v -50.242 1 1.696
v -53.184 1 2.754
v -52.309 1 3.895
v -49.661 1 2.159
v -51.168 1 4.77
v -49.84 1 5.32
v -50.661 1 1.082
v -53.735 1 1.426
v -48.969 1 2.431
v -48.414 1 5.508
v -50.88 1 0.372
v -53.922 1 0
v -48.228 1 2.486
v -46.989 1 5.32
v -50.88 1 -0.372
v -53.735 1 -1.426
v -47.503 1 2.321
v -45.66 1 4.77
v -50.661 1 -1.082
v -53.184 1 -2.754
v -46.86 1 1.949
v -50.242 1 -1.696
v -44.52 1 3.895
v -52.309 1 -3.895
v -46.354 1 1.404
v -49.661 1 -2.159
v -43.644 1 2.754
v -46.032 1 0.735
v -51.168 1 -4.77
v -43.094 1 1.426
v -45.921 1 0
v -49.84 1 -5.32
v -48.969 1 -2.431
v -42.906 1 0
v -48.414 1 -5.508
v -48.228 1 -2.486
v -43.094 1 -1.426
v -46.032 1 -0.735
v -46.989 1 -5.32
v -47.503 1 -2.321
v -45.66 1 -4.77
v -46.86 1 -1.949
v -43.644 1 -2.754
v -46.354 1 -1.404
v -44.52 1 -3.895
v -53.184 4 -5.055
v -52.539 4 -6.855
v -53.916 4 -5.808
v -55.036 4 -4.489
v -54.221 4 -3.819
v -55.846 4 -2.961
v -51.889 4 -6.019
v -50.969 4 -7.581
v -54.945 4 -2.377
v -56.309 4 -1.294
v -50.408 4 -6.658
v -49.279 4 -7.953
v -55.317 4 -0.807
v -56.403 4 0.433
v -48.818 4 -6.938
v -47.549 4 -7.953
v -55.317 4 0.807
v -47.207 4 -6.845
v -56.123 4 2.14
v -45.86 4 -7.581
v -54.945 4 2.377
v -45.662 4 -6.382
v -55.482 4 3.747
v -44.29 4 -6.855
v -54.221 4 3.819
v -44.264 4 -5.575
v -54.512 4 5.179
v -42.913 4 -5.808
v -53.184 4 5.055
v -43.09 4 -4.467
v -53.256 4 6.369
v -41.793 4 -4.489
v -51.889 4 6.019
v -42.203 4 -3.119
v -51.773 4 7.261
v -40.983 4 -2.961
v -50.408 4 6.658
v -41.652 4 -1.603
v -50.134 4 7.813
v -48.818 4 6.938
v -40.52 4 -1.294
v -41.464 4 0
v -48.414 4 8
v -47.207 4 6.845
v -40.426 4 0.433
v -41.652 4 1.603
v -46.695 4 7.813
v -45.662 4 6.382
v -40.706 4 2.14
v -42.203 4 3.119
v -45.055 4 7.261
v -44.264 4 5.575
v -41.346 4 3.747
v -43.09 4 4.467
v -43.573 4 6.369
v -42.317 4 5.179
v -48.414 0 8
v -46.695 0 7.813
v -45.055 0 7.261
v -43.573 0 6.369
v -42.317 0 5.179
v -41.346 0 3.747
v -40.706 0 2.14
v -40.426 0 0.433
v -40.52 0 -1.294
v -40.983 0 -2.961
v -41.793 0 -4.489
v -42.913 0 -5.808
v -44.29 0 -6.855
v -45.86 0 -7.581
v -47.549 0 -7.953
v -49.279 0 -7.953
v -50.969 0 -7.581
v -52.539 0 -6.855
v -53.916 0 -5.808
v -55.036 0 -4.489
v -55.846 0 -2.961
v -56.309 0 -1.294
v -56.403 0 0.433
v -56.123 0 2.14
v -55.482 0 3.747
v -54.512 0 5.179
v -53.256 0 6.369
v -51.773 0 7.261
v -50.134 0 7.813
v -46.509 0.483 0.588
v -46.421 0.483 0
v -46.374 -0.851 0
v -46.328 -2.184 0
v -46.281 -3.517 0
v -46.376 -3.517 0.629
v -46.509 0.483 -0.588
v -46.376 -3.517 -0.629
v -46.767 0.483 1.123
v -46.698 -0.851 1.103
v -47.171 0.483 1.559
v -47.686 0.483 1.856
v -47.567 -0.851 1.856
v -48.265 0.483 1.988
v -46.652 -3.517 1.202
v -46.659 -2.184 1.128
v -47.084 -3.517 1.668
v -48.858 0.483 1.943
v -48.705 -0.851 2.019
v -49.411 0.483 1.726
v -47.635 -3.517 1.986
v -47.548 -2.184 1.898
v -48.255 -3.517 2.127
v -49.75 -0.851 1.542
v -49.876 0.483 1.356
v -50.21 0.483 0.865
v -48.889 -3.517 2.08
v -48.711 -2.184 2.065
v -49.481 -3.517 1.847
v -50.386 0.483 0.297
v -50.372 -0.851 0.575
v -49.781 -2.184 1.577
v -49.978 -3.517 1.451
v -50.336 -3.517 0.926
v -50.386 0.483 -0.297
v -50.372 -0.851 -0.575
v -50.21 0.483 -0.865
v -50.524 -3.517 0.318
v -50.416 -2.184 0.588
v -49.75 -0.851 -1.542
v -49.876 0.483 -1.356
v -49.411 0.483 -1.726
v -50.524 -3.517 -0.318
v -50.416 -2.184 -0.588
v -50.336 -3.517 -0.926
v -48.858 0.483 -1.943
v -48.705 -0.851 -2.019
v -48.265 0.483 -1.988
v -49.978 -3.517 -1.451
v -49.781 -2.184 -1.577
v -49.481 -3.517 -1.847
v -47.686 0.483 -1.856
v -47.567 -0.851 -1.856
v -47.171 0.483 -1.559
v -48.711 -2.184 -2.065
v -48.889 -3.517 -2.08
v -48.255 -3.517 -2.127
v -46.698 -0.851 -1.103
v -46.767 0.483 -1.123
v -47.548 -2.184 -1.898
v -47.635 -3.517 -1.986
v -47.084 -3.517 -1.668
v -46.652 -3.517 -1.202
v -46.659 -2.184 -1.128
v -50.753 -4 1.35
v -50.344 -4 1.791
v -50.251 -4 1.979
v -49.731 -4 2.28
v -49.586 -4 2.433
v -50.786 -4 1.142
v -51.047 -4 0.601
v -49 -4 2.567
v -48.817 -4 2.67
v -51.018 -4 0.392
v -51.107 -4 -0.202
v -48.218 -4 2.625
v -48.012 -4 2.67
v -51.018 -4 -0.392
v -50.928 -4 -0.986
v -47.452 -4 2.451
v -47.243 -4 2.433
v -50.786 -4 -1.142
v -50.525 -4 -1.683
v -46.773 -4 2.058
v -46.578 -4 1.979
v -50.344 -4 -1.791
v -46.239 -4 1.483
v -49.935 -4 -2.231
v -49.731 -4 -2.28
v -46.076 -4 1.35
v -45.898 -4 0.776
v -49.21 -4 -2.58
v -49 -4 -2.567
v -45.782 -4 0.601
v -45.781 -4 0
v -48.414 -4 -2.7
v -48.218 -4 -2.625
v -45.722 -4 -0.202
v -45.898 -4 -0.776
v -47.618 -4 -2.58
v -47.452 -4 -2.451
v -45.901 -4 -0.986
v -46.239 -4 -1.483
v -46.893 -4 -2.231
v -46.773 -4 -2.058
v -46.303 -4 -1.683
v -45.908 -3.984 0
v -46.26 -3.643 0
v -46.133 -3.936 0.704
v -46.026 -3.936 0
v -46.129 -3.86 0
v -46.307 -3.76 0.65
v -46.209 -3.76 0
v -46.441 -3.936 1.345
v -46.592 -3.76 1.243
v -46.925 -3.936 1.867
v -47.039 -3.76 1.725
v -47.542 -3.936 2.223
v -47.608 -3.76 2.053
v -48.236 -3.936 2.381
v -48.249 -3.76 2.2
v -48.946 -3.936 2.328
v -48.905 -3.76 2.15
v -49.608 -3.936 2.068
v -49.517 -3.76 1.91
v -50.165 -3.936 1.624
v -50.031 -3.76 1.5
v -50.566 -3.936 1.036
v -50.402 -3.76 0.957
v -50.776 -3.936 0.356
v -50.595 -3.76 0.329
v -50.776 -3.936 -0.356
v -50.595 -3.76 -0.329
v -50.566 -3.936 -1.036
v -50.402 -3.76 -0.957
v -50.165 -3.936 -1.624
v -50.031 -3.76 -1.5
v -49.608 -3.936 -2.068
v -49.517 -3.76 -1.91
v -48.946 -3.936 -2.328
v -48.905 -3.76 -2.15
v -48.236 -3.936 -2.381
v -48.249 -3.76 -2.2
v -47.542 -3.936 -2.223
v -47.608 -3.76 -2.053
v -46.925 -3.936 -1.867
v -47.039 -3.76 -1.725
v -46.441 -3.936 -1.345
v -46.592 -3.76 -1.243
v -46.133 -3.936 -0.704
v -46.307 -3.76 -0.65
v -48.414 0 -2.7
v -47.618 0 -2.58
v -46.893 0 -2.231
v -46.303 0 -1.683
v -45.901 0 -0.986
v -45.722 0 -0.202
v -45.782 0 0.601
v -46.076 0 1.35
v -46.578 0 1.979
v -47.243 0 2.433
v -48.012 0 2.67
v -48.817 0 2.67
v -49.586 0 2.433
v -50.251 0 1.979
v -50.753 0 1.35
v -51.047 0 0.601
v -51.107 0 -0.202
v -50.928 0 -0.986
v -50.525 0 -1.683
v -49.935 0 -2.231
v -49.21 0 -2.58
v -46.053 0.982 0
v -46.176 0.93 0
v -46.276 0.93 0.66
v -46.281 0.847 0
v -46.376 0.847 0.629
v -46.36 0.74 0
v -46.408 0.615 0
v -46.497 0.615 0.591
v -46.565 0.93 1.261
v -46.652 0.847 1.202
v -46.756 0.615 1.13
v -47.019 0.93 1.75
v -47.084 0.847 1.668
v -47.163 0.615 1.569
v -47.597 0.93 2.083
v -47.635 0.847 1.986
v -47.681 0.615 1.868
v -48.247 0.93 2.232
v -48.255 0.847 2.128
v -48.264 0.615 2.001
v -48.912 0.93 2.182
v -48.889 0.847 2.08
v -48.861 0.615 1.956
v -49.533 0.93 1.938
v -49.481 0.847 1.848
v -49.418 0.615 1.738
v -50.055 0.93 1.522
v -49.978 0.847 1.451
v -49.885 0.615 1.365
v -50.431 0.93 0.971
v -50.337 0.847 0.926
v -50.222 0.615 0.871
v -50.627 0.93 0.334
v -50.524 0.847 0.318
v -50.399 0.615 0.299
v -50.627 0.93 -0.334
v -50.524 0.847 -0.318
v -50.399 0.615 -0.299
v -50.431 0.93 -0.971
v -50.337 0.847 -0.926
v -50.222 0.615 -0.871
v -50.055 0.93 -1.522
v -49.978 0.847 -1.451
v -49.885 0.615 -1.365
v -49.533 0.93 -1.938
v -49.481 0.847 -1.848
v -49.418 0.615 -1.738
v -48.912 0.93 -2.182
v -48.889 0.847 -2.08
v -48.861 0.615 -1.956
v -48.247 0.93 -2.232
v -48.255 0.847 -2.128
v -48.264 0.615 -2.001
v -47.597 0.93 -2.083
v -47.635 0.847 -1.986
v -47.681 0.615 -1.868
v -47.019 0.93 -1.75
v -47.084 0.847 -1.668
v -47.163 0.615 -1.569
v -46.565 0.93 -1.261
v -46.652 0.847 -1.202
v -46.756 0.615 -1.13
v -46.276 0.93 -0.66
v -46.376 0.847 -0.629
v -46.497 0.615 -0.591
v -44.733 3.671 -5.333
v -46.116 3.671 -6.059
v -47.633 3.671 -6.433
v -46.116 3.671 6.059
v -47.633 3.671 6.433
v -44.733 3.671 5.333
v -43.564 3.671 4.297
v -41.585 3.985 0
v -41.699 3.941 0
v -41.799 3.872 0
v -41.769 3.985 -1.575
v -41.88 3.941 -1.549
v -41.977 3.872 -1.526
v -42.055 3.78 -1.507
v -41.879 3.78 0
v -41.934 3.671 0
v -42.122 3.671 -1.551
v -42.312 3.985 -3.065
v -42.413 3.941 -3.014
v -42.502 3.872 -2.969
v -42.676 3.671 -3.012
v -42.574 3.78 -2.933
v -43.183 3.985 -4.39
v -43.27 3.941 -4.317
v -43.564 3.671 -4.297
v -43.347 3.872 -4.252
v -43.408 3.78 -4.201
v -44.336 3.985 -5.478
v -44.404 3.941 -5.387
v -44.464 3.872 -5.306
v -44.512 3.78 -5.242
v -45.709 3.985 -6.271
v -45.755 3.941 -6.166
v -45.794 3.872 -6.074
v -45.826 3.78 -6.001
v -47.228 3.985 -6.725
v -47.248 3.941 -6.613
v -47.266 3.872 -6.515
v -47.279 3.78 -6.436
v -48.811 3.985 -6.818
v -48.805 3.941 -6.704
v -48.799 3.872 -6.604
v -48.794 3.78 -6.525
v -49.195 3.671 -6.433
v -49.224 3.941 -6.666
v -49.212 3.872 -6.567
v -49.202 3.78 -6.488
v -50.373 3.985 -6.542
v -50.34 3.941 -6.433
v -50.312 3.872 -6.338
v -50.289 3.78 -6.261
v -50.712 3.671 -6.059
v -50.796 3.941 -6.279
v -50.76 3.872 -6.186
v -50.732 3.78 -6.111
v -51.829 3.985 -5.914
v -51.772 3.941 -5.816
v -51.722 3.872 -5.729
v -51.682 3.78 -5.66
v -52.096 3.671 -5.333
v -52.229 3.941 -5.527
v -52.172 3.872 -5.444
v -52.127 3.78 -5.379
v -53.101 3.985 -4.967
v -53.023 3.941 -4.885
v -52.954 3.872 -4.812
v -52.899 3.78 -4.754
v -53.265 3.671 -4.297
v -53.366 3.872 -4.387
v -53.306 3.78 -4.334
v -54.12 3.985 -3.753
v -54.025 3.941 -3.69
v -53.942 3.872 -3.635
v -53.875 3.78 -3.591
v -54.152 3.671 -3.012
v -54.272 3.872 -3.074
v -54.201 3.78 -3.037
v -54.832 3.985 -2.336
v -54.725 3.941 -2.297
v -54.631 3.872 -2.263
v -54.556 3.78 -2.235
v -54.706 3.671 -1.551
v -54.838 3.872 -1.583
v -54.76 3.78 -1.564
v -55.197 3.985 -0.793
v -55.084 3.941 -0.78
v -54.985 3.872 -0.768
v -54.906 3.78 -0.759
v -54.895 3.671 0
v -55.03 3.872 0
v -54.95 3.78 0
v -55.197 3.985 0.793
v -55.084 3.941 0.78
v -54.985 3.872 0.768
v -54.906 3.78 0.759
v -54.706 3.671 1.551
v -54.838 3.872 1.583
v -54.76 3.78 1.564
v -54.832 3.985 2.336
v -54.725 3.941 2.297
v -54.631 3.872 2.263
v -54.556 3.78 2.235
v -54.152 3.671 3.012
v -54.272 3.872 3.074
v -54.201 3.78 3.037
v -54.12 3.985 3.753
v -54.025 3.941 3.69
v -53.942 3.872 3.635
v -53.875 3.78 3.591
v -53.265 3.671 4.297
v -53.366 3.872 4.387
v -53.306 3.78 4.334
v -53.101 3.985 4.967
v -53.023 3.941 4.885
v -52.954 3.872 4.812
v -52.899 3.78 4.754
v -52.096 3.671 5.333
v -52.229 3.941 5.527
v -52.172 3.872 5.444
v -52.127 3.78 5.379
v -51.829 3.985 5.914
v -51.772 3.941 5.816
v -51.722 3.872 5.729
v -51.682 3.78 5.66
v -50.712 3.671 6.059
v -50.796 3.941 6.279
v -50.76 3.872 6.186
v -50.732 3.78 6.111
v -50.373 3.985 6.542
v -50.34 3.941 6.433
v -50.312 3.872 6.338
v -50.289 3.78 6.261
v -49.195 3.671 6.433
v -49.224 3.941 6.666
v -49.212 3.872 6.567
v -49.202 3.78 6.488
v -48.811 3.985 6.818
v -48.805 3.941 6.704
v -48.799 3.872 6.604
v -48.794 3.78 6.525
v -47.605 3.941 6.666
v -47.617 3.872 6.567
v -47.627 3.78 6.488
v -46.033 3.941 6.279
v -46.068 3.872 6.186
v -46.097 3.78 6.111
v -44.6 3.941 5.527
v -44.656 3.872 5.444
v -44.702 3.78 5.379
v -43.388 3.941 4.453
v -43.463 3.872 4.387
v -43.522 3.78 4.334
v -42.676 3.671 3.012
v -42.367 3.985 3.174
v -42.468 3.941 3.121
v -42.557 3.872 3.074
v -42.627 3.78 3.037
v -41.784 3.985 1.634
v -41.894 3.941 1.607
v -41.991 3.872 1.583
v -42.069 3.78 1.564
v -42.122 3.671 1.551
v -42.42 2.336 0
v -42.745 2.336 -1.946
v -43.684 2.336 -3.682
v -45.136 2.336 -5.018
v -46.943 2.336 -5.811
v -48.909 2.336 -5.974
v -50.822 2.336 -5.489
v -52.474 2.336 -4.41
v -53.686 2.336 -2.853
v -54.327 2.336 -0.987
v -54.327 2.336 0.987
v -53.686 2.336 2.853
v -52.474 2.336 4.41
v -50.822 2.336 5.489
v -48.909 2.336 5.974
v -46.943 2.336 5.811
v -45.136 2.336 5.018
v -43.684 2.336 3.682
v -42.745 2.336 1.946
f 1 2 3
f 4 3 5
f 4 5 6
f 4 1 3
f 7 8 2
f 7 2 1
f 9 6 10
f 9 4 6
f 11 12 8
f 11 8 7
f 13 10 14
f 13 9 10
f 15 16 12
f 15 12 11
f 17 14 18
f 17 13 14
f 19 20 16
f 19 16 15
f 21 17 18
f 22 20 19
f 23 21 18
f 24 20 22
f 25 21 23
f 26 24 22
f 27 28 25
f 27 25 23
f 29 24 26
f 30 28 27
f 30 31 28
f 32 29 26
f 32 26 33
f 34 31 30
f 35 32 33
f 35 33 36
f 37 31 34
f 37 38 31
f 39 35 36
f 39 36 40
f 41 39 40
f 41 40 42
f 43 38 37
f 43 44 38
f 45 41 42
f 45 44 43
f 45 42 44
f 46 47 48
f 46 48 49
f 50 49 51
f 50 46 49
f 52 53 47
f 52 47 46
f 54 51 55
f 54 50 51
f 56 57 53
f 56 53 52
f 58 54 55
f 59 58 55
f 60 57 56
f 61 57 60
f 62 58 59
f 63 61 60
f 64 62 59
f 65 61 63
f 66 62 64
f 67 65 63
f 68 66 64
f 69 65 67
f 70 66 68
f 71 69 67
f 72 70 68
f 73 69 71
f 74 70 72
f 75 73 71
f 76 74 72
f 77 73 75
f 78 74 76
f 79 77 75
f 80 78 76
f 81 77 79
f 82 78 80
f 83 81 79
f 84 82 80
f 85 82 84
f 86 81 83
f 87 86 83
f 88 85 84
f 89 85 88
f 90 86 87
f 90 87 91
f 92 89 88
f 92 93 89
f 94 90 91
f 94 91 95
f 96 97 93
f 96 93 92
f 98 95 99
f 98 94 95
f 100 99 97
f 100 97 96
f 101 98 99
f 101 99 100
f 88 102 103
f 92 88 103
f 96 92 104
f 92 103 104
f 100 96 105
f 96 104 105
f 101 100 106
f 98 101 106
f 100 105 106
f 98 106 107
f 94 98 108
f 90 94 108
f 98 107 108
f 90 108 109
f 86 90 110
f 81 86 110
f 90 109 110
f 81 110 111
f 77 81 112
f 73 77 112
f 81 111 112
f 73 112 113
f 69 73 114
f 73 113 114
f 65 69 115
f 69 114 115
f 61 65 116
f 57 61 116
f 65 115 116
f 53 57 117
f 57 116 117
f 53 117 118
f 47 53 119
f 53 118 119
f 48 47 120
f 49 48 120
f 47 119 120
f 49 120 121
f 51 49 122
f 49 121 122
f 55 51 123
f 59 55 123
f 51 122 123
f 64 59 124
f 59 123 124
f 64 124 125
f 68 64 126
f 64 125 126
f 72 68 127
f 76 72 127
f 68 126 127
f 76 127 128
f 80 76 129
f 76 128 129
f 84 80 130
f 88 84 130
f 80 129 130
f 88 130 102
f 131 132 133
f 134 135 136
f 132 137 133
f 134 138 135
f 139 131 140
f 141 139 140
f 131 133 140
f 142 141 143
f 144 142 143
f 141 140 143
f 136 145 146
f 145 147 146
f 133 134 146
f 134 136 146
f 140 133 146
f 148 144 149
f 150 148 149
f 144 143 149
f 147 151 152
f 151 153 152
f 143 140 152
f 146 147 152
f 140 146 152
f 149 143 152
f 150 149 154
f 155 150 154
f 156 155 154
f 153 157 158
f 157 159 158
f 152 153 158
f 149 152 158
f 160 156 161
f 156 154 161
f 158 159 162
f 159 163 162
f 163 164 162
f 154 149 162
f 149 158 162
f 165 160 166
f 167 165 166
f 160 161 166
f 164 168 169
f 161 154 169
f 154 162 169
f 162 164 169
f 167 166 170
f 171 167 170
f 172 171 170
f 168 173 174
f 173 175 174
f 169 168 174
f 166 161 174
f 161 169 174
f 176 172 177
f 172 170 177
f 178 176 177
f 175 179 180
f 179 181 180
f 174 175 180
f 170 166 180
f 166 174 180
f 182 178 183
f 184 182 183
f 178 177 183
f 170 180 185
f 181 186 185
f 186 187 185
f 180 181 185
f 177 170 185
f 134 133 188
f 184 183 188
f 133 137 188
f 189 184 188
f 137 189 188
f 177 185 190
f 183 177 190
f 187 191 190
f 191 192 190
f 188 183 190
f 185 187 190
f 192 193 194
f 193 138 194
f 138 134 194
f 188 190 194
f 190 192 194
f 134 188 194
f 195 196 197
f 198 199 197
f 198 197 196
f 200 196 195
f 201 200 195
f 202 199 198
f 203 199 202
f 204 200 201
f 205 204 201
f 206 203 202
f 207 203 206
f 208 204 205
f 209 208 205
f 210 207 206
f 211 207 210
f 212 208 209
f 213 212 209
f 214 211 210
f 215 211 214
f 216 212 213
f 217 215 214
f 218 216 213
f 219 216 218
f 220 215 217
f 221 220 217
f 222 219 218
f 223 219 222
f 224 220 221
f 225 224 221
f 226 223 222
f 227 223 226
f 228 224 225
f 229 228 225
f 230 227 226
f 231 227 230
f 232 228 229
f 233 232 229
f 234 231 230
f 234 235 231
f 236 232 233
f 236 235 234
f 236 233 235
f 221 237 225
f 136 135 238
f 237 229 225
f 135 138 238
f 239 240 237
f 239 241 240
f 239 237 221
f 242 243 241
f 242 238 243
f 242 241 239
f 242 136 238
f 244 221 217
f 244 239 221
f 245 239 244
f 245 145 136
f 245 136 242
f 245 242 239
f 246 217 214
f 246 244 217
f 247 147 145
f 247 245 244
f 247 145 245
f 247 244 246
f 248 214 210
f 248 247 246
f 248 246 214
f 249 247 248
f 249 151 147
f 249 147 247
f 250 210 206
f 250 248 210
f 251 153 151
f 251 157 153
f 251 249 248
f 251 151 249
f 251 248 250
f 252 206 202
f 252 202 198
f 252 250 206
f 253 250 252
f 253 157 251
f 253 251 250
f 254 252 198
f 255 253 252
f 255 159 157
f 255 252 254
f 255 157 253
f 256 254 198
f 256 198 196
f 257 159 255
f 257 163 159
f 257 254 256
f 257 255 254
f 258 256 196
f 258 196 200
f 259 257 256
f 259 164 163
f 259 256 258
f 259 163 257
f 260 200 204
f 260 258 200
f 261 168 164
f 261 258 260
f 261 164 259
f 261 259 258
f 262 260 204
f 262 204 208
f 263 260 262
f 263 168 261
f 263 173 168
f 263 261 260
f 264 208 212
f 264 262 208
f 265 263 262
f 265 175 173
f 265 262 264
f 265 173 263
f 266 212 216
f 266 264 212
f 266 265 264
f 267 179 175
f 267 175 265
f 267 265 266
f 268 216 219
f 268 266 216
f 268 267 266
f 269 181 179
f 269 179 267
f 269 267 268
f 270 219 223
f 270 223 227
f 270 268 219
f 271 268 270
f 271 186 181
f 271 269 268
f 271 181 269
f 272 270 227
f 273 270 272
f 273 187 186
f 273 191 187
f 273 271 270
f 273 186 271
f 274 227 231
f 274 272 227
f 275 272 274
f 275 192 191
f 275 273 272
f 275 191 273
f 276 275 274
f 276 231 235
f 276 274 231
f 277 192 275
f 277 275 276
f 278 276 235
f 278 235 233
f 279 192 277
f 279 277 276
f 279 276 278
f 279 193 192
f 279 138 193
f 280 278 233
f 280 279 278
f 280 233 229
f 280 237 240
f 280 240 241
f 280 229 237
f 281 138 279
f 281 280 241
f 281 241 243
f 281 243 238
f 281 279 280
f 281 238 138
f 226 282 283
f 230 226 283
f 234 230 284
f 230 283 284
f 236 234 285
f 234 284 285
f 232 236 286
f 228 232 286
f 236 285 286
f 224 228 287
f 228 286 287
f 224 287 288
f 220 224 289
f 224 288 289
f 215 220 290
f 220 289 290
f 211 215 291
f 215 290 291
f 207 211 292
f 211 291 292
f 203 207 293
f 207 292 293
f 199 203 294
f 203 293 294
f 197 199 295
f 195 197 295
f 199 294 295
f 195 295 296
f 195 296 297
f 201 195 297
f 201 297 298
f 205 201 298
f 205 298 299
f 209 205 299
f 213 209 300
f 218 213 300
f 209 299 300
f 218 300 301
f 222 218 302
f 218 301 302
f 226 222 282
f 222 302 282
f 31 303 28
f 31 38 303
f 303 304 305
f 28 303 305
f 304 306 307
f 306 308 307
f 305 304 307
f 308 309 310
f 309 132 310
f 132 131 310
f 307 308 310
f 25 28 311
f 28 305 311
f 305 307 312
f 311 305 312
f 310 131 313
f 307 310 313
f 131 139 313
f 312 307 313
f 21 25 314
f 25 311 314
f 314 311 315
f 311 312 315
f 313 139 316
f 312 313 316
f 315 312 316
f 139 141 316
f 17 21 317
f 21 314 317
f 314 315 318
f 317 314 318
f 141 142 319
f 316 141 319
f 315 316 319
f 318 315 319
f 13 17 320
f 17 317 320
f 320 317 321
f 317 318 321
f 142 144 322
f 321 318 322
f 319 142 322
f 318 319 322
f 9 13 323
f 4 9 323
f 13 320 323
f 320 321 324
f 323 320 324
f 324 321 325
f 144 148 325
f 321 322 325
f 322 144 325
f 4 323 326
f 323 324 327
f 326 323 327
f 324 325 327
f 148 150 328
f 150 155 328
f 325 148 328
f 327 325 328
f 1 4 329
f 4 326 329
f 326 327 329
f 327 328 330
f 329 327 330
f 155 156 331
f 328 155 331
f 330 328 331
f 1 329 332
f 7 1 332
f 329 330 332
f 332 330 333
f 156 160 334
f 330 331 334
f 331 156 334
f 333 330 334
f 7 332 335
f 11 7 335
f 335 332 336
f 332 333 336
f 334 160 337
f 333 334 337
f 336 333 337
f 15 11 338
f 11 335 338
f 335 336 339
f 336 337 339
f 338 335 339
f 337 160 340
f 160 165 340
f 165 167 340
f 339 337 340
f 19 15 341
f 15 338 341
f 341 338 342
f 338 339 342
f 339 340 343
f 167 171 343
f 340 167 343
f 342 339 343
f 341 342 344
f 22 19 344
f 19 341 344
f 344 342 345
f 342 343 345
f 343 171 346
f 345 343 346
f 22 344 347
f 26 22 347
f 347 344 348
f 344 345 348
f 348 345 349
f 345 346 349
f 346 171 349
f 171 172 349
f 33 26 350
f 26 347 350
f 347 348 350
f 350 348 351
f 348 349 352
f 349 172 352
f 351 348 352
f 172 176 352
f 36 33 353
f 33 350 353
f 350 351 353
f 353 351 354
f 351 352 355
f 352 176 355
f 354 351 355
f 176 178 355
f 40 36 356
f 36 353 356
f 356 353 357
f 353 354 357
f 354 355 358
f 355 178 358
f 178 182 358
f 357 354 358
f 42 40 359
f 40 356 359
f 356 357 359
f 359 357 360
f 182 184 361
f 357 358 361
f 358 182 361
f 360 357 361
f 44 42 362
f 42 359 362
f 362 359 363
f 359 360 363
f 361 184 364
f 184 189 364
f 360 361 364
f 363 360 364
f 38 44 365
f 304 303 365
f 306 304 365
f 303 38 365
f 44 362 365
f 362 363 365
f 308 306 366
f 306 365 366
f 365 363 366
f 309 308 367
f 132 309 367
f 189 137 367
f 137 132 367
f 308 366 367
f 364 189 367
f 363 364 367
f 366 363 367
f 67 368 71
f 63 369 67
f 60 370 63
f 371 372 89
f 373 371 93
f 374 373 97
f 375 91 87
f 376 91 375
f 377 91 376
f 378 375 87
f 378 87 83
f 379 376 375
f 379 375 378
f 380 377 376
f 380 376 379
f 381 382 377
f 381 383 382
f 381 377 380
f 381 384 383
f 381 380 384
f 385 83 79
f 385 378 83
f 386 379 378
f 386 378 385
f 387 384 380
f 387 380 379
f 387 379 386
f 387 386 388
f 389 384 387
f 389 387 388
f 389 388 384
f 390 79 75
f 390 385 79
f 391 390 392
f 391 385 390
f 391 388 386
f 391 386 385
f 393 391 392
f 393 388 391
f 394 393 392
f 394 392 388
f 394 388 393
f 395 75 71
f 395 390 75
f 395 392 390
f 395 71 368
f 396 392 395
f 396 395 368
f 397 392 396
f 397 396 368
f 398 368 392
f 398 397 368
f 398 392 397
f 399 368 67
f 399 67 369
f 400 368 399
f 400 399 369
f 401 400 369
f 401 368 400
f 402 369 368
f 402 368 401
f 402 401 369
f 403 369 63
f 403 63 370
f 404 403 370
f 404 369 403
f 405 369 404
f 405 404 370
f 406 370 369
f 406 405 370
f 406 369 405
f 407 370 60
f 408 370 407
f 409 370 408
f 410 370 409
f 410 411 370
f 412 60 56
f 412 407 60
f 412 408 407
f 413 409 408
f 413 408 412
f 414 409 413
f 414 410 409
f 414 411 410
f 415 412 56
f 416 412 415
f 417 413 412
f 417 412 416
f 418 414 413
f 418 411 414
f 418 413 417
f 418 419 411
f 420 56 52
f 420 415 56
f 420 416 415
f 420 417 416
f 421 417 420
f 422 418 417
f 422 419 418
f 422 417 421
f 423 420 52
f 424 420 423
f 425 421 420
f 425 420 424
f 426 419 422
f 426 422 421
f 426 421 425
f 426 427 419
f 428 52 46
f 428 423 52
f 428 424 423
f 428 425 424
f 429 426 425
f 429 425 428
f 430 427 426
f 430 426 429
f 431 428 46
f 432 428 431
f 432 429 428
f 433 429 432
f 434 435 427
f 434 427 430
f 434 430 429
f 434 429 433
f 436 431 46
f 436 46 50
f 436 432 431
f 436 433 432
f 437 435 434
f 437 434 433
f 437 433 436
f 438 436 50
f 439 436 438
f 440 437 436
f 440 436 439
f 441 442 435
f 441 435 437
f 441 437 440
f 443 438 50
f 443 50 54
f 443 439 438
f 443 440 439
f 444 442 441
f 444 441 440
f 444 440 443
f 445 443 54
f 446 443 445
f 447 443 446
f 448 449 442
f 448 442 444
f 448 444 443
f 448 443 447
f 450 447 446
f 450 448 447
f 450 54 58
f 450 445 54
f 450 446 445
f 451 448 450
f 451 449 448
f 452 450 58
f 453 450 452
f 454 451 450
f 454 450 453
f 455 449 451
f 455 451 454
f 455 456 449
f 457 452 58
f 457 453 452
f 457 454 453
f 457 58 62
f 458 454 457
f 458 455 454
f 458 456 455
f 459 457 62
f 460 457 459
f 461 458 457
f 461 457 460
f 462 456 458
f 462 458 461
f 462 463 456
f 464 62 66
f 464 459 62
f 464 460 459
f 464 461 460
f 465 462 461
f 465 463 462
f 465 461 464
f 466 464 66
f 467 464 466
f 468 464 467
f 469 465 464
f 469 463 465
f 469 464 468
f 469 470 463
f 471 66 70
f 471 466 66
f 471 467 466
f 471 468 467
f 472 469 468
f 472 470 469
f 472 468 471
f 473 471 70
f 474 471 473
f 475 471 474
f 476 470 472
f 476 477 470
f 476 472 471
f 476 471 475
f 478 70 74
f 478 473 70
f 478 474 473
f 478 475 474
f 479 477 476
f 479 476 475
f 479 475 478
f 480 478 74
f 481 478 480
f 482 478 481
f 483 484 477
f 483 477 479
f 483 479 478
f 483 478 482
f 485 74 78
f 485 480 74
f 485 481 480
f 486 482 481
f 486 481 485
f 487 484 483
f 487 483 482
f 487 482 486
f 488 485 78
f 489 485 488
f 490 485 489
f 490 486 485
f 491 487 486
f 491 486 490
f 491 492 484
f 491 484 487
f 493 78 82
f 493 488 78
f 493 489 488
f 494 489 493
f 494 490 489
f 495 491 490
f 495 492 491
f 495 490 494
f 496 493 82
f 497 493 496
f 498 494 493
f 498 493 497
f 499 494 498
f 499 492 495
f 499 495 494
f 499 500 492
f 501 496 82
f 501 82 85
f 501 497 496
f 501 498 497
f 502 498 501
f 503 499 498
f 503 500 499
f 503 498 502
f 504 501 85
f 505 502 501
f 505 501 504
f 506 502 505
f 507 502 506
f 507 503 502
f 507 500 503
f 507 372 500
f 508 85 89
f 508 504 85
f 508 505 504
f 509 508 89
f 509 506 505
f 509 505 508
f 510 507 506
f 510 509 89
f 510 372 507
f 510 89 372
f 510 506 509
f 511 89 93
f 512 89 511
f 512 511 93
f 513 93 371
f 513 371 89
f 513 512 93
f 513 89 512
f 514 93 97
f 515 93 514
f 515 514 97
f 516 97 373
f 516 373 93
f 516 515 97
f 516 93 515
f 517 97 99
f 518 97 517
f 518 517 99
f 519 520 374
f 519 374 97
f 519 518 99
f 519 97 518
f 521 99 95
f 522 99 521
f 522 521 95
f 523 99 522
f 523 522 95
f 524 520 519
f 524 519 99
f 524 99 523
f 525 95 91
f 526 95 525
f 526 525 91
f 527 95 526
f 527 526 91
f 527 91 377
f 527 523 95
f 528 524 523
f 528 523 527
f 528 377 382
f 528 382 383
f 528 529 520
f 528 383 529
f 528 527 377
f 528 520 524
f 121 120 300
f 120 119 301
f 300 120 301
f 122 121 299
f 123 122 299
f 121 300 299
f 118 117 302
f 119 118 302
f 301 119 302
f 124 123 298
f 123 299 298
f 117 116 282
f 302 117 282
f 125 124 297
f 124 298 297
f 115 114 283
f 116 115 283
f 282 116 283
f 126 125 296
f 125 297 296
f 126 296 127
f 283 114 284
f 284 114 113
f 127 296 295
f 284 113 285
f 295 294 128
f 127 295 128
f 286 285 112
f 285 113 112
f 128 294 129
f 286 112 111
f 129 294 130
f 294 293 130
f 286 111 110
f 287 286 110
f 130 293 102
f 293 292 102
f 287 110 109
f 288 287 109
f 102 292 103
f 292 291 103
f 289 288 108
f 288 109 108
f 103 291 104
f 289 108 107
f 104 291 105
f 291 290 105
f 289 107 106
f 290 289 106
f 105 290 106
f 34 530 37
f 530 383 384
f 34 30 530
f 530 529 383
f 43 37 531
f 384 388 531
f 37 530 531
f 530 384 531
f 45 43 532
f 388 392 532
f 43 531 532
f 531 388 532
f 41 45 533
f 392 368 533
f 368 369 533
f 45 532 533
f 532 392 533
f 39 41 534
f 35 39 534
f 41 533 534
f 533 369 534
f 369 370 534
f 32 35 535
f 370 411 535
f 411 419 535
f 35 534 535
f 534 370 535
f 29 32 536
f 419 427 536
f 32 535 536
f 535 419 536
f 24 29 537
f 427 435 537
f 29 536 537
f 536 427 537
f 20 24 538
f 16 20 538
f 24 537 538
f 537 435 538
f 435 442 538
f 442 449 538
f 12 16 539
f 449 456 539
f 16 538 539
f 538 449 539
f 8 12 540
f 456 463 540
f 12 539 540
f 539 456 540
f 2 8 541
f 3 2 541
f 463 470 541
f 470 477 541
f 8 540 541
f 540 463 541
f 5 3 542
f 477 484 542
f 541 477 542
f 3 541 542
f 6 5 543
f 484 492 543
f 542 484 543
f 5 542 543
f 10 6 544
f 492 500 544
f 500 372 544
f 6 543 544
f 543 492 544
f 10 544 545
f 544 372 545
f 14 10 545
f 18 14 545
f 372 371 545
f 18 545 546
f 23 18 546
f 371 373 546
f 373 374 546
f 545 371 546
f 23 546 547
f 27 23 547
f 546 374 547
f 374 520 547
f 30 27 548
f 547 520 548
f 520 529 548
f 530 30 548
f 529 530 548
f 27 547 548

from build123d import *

# Parameters (mm, degrees)
SKETCH1_R           = 8
BOSS_EXTRUDE3_DEPTH = 4
SKETCH5_R           = 6.6
CUT_EXTRUDE2_DEPTH  = 3
CUT_EXTRUDE2_DRAFT  = -20
SKETCH6_R           = 2.7
BOSS_EXTRUDE4_DEPTH = 4
SKETCH7_R           = 2.15
CUT_EXTRUDE3_DEPTH  = 6
CUT_EXTRUDE3_DRAFT  = -2
FILLET1_R           = 0.5


with BuildPart() as part:
    # Sketch1 → Boss-Extrude3 (new body)
    with BuildSketch(Plane(origin=(0, 0, 0), x_dir=(1, 0, 0), z_dir=(0, 1, 0))):
        with Locations(Location((-48.414322475, 0, 0), (0, 0, 270))):
            Circle(SKETCH1_R)
    extrude(amount=BOSS_EXTRUDE3_DEPTH)


with BuildPart() as cut_extrude2_tool:
    # Sketch5 → Cut-Extrude2 (with draft: the straight prism first)
    with BuildSketch(Plane(origin=(0, 4, 0), x_dir=(1, 0, 0), z_dir=(0, 1, 0))):
        with Locations((-48.414322475, 0)):
            Circle(SKETCH5_R)
    extrude(amount=-CUT_EXTRUDE2_DEPTH)
    # Cut-Extrude2: the draft: its side faces are tilted about the plane it starts from
    cut_extrude2_sides = [cut_extrude2_tool.faces().sort_by_distance(p)[0] for p in [
        (-55.014322475, 2.5, 0),
    ]]
    draft(cut_extrude2_sides, Plane(origin=(0, 4, 0), x_dir=(1, 0, 0), z_dir=(0, 1, 0)), CUT_EXTRUDE2_DRAFT)


with BuildPart() as part_1:
    add(part.part)

    # Cut-Extrude2: cut by cut_extrude2_tool
    add(cut_extrude2_tool.part, mode=Mode.SUBTRACT)

    # Sketch6 → Boss-Extrude4 (add)
    with BuildSketch(Plane.XZ):
        with Locations(Location((-48.414322475, 0, 0), (0, 0, 270))):
            Circle(SKETCH6_R)
    extrude(amount=BOSS_EXTRUDE4_DEPTH)


with BuildPart() as cut_extrude3_tool:
    # Sketch7 → Cut-Extrude3 (with draft: the straight prism first)
    with BuildSketch(Plane.XZ.offset(4)):
        with Locations((-48.414322475, 0)):
            Circle(SKETCH7_R)
    extrude(amount=-CUT_EXTRUDE3_DEPTH)
    # Cut-Extrude3: the draft: its side faces are tilted about the plane it starts from
    cut_extrude3_sides = [cut_extrude3_tool.faces().sort_by_distance(p)[0] for p in [
        (-50.564322475, -1, 0),
    ]]
    draft(cut_extrude3_sides, Plane.XZ.offset(4), CUT_EXTRUDE3_DRAFT)


with BuildPart() as part_2:
    add(part_1.part)

    # Cut-Extrude3: cut by cut_extrude3_tool
    add(cut_extrude3_tool.part, mode=Mode.SUBTRACT)

    # Fillet1
    fillet1_edges = [part_2.edges().sort_by_distance(p)[0] for p in [
        (-50.389718627, 1, 0),
        (-50.564322475, -4, 0),
        (-55.014322475, 4, 0),
    ]]
    fillet(fillet1_edges, radius=FILLET1_R)


solid = part_2.part
